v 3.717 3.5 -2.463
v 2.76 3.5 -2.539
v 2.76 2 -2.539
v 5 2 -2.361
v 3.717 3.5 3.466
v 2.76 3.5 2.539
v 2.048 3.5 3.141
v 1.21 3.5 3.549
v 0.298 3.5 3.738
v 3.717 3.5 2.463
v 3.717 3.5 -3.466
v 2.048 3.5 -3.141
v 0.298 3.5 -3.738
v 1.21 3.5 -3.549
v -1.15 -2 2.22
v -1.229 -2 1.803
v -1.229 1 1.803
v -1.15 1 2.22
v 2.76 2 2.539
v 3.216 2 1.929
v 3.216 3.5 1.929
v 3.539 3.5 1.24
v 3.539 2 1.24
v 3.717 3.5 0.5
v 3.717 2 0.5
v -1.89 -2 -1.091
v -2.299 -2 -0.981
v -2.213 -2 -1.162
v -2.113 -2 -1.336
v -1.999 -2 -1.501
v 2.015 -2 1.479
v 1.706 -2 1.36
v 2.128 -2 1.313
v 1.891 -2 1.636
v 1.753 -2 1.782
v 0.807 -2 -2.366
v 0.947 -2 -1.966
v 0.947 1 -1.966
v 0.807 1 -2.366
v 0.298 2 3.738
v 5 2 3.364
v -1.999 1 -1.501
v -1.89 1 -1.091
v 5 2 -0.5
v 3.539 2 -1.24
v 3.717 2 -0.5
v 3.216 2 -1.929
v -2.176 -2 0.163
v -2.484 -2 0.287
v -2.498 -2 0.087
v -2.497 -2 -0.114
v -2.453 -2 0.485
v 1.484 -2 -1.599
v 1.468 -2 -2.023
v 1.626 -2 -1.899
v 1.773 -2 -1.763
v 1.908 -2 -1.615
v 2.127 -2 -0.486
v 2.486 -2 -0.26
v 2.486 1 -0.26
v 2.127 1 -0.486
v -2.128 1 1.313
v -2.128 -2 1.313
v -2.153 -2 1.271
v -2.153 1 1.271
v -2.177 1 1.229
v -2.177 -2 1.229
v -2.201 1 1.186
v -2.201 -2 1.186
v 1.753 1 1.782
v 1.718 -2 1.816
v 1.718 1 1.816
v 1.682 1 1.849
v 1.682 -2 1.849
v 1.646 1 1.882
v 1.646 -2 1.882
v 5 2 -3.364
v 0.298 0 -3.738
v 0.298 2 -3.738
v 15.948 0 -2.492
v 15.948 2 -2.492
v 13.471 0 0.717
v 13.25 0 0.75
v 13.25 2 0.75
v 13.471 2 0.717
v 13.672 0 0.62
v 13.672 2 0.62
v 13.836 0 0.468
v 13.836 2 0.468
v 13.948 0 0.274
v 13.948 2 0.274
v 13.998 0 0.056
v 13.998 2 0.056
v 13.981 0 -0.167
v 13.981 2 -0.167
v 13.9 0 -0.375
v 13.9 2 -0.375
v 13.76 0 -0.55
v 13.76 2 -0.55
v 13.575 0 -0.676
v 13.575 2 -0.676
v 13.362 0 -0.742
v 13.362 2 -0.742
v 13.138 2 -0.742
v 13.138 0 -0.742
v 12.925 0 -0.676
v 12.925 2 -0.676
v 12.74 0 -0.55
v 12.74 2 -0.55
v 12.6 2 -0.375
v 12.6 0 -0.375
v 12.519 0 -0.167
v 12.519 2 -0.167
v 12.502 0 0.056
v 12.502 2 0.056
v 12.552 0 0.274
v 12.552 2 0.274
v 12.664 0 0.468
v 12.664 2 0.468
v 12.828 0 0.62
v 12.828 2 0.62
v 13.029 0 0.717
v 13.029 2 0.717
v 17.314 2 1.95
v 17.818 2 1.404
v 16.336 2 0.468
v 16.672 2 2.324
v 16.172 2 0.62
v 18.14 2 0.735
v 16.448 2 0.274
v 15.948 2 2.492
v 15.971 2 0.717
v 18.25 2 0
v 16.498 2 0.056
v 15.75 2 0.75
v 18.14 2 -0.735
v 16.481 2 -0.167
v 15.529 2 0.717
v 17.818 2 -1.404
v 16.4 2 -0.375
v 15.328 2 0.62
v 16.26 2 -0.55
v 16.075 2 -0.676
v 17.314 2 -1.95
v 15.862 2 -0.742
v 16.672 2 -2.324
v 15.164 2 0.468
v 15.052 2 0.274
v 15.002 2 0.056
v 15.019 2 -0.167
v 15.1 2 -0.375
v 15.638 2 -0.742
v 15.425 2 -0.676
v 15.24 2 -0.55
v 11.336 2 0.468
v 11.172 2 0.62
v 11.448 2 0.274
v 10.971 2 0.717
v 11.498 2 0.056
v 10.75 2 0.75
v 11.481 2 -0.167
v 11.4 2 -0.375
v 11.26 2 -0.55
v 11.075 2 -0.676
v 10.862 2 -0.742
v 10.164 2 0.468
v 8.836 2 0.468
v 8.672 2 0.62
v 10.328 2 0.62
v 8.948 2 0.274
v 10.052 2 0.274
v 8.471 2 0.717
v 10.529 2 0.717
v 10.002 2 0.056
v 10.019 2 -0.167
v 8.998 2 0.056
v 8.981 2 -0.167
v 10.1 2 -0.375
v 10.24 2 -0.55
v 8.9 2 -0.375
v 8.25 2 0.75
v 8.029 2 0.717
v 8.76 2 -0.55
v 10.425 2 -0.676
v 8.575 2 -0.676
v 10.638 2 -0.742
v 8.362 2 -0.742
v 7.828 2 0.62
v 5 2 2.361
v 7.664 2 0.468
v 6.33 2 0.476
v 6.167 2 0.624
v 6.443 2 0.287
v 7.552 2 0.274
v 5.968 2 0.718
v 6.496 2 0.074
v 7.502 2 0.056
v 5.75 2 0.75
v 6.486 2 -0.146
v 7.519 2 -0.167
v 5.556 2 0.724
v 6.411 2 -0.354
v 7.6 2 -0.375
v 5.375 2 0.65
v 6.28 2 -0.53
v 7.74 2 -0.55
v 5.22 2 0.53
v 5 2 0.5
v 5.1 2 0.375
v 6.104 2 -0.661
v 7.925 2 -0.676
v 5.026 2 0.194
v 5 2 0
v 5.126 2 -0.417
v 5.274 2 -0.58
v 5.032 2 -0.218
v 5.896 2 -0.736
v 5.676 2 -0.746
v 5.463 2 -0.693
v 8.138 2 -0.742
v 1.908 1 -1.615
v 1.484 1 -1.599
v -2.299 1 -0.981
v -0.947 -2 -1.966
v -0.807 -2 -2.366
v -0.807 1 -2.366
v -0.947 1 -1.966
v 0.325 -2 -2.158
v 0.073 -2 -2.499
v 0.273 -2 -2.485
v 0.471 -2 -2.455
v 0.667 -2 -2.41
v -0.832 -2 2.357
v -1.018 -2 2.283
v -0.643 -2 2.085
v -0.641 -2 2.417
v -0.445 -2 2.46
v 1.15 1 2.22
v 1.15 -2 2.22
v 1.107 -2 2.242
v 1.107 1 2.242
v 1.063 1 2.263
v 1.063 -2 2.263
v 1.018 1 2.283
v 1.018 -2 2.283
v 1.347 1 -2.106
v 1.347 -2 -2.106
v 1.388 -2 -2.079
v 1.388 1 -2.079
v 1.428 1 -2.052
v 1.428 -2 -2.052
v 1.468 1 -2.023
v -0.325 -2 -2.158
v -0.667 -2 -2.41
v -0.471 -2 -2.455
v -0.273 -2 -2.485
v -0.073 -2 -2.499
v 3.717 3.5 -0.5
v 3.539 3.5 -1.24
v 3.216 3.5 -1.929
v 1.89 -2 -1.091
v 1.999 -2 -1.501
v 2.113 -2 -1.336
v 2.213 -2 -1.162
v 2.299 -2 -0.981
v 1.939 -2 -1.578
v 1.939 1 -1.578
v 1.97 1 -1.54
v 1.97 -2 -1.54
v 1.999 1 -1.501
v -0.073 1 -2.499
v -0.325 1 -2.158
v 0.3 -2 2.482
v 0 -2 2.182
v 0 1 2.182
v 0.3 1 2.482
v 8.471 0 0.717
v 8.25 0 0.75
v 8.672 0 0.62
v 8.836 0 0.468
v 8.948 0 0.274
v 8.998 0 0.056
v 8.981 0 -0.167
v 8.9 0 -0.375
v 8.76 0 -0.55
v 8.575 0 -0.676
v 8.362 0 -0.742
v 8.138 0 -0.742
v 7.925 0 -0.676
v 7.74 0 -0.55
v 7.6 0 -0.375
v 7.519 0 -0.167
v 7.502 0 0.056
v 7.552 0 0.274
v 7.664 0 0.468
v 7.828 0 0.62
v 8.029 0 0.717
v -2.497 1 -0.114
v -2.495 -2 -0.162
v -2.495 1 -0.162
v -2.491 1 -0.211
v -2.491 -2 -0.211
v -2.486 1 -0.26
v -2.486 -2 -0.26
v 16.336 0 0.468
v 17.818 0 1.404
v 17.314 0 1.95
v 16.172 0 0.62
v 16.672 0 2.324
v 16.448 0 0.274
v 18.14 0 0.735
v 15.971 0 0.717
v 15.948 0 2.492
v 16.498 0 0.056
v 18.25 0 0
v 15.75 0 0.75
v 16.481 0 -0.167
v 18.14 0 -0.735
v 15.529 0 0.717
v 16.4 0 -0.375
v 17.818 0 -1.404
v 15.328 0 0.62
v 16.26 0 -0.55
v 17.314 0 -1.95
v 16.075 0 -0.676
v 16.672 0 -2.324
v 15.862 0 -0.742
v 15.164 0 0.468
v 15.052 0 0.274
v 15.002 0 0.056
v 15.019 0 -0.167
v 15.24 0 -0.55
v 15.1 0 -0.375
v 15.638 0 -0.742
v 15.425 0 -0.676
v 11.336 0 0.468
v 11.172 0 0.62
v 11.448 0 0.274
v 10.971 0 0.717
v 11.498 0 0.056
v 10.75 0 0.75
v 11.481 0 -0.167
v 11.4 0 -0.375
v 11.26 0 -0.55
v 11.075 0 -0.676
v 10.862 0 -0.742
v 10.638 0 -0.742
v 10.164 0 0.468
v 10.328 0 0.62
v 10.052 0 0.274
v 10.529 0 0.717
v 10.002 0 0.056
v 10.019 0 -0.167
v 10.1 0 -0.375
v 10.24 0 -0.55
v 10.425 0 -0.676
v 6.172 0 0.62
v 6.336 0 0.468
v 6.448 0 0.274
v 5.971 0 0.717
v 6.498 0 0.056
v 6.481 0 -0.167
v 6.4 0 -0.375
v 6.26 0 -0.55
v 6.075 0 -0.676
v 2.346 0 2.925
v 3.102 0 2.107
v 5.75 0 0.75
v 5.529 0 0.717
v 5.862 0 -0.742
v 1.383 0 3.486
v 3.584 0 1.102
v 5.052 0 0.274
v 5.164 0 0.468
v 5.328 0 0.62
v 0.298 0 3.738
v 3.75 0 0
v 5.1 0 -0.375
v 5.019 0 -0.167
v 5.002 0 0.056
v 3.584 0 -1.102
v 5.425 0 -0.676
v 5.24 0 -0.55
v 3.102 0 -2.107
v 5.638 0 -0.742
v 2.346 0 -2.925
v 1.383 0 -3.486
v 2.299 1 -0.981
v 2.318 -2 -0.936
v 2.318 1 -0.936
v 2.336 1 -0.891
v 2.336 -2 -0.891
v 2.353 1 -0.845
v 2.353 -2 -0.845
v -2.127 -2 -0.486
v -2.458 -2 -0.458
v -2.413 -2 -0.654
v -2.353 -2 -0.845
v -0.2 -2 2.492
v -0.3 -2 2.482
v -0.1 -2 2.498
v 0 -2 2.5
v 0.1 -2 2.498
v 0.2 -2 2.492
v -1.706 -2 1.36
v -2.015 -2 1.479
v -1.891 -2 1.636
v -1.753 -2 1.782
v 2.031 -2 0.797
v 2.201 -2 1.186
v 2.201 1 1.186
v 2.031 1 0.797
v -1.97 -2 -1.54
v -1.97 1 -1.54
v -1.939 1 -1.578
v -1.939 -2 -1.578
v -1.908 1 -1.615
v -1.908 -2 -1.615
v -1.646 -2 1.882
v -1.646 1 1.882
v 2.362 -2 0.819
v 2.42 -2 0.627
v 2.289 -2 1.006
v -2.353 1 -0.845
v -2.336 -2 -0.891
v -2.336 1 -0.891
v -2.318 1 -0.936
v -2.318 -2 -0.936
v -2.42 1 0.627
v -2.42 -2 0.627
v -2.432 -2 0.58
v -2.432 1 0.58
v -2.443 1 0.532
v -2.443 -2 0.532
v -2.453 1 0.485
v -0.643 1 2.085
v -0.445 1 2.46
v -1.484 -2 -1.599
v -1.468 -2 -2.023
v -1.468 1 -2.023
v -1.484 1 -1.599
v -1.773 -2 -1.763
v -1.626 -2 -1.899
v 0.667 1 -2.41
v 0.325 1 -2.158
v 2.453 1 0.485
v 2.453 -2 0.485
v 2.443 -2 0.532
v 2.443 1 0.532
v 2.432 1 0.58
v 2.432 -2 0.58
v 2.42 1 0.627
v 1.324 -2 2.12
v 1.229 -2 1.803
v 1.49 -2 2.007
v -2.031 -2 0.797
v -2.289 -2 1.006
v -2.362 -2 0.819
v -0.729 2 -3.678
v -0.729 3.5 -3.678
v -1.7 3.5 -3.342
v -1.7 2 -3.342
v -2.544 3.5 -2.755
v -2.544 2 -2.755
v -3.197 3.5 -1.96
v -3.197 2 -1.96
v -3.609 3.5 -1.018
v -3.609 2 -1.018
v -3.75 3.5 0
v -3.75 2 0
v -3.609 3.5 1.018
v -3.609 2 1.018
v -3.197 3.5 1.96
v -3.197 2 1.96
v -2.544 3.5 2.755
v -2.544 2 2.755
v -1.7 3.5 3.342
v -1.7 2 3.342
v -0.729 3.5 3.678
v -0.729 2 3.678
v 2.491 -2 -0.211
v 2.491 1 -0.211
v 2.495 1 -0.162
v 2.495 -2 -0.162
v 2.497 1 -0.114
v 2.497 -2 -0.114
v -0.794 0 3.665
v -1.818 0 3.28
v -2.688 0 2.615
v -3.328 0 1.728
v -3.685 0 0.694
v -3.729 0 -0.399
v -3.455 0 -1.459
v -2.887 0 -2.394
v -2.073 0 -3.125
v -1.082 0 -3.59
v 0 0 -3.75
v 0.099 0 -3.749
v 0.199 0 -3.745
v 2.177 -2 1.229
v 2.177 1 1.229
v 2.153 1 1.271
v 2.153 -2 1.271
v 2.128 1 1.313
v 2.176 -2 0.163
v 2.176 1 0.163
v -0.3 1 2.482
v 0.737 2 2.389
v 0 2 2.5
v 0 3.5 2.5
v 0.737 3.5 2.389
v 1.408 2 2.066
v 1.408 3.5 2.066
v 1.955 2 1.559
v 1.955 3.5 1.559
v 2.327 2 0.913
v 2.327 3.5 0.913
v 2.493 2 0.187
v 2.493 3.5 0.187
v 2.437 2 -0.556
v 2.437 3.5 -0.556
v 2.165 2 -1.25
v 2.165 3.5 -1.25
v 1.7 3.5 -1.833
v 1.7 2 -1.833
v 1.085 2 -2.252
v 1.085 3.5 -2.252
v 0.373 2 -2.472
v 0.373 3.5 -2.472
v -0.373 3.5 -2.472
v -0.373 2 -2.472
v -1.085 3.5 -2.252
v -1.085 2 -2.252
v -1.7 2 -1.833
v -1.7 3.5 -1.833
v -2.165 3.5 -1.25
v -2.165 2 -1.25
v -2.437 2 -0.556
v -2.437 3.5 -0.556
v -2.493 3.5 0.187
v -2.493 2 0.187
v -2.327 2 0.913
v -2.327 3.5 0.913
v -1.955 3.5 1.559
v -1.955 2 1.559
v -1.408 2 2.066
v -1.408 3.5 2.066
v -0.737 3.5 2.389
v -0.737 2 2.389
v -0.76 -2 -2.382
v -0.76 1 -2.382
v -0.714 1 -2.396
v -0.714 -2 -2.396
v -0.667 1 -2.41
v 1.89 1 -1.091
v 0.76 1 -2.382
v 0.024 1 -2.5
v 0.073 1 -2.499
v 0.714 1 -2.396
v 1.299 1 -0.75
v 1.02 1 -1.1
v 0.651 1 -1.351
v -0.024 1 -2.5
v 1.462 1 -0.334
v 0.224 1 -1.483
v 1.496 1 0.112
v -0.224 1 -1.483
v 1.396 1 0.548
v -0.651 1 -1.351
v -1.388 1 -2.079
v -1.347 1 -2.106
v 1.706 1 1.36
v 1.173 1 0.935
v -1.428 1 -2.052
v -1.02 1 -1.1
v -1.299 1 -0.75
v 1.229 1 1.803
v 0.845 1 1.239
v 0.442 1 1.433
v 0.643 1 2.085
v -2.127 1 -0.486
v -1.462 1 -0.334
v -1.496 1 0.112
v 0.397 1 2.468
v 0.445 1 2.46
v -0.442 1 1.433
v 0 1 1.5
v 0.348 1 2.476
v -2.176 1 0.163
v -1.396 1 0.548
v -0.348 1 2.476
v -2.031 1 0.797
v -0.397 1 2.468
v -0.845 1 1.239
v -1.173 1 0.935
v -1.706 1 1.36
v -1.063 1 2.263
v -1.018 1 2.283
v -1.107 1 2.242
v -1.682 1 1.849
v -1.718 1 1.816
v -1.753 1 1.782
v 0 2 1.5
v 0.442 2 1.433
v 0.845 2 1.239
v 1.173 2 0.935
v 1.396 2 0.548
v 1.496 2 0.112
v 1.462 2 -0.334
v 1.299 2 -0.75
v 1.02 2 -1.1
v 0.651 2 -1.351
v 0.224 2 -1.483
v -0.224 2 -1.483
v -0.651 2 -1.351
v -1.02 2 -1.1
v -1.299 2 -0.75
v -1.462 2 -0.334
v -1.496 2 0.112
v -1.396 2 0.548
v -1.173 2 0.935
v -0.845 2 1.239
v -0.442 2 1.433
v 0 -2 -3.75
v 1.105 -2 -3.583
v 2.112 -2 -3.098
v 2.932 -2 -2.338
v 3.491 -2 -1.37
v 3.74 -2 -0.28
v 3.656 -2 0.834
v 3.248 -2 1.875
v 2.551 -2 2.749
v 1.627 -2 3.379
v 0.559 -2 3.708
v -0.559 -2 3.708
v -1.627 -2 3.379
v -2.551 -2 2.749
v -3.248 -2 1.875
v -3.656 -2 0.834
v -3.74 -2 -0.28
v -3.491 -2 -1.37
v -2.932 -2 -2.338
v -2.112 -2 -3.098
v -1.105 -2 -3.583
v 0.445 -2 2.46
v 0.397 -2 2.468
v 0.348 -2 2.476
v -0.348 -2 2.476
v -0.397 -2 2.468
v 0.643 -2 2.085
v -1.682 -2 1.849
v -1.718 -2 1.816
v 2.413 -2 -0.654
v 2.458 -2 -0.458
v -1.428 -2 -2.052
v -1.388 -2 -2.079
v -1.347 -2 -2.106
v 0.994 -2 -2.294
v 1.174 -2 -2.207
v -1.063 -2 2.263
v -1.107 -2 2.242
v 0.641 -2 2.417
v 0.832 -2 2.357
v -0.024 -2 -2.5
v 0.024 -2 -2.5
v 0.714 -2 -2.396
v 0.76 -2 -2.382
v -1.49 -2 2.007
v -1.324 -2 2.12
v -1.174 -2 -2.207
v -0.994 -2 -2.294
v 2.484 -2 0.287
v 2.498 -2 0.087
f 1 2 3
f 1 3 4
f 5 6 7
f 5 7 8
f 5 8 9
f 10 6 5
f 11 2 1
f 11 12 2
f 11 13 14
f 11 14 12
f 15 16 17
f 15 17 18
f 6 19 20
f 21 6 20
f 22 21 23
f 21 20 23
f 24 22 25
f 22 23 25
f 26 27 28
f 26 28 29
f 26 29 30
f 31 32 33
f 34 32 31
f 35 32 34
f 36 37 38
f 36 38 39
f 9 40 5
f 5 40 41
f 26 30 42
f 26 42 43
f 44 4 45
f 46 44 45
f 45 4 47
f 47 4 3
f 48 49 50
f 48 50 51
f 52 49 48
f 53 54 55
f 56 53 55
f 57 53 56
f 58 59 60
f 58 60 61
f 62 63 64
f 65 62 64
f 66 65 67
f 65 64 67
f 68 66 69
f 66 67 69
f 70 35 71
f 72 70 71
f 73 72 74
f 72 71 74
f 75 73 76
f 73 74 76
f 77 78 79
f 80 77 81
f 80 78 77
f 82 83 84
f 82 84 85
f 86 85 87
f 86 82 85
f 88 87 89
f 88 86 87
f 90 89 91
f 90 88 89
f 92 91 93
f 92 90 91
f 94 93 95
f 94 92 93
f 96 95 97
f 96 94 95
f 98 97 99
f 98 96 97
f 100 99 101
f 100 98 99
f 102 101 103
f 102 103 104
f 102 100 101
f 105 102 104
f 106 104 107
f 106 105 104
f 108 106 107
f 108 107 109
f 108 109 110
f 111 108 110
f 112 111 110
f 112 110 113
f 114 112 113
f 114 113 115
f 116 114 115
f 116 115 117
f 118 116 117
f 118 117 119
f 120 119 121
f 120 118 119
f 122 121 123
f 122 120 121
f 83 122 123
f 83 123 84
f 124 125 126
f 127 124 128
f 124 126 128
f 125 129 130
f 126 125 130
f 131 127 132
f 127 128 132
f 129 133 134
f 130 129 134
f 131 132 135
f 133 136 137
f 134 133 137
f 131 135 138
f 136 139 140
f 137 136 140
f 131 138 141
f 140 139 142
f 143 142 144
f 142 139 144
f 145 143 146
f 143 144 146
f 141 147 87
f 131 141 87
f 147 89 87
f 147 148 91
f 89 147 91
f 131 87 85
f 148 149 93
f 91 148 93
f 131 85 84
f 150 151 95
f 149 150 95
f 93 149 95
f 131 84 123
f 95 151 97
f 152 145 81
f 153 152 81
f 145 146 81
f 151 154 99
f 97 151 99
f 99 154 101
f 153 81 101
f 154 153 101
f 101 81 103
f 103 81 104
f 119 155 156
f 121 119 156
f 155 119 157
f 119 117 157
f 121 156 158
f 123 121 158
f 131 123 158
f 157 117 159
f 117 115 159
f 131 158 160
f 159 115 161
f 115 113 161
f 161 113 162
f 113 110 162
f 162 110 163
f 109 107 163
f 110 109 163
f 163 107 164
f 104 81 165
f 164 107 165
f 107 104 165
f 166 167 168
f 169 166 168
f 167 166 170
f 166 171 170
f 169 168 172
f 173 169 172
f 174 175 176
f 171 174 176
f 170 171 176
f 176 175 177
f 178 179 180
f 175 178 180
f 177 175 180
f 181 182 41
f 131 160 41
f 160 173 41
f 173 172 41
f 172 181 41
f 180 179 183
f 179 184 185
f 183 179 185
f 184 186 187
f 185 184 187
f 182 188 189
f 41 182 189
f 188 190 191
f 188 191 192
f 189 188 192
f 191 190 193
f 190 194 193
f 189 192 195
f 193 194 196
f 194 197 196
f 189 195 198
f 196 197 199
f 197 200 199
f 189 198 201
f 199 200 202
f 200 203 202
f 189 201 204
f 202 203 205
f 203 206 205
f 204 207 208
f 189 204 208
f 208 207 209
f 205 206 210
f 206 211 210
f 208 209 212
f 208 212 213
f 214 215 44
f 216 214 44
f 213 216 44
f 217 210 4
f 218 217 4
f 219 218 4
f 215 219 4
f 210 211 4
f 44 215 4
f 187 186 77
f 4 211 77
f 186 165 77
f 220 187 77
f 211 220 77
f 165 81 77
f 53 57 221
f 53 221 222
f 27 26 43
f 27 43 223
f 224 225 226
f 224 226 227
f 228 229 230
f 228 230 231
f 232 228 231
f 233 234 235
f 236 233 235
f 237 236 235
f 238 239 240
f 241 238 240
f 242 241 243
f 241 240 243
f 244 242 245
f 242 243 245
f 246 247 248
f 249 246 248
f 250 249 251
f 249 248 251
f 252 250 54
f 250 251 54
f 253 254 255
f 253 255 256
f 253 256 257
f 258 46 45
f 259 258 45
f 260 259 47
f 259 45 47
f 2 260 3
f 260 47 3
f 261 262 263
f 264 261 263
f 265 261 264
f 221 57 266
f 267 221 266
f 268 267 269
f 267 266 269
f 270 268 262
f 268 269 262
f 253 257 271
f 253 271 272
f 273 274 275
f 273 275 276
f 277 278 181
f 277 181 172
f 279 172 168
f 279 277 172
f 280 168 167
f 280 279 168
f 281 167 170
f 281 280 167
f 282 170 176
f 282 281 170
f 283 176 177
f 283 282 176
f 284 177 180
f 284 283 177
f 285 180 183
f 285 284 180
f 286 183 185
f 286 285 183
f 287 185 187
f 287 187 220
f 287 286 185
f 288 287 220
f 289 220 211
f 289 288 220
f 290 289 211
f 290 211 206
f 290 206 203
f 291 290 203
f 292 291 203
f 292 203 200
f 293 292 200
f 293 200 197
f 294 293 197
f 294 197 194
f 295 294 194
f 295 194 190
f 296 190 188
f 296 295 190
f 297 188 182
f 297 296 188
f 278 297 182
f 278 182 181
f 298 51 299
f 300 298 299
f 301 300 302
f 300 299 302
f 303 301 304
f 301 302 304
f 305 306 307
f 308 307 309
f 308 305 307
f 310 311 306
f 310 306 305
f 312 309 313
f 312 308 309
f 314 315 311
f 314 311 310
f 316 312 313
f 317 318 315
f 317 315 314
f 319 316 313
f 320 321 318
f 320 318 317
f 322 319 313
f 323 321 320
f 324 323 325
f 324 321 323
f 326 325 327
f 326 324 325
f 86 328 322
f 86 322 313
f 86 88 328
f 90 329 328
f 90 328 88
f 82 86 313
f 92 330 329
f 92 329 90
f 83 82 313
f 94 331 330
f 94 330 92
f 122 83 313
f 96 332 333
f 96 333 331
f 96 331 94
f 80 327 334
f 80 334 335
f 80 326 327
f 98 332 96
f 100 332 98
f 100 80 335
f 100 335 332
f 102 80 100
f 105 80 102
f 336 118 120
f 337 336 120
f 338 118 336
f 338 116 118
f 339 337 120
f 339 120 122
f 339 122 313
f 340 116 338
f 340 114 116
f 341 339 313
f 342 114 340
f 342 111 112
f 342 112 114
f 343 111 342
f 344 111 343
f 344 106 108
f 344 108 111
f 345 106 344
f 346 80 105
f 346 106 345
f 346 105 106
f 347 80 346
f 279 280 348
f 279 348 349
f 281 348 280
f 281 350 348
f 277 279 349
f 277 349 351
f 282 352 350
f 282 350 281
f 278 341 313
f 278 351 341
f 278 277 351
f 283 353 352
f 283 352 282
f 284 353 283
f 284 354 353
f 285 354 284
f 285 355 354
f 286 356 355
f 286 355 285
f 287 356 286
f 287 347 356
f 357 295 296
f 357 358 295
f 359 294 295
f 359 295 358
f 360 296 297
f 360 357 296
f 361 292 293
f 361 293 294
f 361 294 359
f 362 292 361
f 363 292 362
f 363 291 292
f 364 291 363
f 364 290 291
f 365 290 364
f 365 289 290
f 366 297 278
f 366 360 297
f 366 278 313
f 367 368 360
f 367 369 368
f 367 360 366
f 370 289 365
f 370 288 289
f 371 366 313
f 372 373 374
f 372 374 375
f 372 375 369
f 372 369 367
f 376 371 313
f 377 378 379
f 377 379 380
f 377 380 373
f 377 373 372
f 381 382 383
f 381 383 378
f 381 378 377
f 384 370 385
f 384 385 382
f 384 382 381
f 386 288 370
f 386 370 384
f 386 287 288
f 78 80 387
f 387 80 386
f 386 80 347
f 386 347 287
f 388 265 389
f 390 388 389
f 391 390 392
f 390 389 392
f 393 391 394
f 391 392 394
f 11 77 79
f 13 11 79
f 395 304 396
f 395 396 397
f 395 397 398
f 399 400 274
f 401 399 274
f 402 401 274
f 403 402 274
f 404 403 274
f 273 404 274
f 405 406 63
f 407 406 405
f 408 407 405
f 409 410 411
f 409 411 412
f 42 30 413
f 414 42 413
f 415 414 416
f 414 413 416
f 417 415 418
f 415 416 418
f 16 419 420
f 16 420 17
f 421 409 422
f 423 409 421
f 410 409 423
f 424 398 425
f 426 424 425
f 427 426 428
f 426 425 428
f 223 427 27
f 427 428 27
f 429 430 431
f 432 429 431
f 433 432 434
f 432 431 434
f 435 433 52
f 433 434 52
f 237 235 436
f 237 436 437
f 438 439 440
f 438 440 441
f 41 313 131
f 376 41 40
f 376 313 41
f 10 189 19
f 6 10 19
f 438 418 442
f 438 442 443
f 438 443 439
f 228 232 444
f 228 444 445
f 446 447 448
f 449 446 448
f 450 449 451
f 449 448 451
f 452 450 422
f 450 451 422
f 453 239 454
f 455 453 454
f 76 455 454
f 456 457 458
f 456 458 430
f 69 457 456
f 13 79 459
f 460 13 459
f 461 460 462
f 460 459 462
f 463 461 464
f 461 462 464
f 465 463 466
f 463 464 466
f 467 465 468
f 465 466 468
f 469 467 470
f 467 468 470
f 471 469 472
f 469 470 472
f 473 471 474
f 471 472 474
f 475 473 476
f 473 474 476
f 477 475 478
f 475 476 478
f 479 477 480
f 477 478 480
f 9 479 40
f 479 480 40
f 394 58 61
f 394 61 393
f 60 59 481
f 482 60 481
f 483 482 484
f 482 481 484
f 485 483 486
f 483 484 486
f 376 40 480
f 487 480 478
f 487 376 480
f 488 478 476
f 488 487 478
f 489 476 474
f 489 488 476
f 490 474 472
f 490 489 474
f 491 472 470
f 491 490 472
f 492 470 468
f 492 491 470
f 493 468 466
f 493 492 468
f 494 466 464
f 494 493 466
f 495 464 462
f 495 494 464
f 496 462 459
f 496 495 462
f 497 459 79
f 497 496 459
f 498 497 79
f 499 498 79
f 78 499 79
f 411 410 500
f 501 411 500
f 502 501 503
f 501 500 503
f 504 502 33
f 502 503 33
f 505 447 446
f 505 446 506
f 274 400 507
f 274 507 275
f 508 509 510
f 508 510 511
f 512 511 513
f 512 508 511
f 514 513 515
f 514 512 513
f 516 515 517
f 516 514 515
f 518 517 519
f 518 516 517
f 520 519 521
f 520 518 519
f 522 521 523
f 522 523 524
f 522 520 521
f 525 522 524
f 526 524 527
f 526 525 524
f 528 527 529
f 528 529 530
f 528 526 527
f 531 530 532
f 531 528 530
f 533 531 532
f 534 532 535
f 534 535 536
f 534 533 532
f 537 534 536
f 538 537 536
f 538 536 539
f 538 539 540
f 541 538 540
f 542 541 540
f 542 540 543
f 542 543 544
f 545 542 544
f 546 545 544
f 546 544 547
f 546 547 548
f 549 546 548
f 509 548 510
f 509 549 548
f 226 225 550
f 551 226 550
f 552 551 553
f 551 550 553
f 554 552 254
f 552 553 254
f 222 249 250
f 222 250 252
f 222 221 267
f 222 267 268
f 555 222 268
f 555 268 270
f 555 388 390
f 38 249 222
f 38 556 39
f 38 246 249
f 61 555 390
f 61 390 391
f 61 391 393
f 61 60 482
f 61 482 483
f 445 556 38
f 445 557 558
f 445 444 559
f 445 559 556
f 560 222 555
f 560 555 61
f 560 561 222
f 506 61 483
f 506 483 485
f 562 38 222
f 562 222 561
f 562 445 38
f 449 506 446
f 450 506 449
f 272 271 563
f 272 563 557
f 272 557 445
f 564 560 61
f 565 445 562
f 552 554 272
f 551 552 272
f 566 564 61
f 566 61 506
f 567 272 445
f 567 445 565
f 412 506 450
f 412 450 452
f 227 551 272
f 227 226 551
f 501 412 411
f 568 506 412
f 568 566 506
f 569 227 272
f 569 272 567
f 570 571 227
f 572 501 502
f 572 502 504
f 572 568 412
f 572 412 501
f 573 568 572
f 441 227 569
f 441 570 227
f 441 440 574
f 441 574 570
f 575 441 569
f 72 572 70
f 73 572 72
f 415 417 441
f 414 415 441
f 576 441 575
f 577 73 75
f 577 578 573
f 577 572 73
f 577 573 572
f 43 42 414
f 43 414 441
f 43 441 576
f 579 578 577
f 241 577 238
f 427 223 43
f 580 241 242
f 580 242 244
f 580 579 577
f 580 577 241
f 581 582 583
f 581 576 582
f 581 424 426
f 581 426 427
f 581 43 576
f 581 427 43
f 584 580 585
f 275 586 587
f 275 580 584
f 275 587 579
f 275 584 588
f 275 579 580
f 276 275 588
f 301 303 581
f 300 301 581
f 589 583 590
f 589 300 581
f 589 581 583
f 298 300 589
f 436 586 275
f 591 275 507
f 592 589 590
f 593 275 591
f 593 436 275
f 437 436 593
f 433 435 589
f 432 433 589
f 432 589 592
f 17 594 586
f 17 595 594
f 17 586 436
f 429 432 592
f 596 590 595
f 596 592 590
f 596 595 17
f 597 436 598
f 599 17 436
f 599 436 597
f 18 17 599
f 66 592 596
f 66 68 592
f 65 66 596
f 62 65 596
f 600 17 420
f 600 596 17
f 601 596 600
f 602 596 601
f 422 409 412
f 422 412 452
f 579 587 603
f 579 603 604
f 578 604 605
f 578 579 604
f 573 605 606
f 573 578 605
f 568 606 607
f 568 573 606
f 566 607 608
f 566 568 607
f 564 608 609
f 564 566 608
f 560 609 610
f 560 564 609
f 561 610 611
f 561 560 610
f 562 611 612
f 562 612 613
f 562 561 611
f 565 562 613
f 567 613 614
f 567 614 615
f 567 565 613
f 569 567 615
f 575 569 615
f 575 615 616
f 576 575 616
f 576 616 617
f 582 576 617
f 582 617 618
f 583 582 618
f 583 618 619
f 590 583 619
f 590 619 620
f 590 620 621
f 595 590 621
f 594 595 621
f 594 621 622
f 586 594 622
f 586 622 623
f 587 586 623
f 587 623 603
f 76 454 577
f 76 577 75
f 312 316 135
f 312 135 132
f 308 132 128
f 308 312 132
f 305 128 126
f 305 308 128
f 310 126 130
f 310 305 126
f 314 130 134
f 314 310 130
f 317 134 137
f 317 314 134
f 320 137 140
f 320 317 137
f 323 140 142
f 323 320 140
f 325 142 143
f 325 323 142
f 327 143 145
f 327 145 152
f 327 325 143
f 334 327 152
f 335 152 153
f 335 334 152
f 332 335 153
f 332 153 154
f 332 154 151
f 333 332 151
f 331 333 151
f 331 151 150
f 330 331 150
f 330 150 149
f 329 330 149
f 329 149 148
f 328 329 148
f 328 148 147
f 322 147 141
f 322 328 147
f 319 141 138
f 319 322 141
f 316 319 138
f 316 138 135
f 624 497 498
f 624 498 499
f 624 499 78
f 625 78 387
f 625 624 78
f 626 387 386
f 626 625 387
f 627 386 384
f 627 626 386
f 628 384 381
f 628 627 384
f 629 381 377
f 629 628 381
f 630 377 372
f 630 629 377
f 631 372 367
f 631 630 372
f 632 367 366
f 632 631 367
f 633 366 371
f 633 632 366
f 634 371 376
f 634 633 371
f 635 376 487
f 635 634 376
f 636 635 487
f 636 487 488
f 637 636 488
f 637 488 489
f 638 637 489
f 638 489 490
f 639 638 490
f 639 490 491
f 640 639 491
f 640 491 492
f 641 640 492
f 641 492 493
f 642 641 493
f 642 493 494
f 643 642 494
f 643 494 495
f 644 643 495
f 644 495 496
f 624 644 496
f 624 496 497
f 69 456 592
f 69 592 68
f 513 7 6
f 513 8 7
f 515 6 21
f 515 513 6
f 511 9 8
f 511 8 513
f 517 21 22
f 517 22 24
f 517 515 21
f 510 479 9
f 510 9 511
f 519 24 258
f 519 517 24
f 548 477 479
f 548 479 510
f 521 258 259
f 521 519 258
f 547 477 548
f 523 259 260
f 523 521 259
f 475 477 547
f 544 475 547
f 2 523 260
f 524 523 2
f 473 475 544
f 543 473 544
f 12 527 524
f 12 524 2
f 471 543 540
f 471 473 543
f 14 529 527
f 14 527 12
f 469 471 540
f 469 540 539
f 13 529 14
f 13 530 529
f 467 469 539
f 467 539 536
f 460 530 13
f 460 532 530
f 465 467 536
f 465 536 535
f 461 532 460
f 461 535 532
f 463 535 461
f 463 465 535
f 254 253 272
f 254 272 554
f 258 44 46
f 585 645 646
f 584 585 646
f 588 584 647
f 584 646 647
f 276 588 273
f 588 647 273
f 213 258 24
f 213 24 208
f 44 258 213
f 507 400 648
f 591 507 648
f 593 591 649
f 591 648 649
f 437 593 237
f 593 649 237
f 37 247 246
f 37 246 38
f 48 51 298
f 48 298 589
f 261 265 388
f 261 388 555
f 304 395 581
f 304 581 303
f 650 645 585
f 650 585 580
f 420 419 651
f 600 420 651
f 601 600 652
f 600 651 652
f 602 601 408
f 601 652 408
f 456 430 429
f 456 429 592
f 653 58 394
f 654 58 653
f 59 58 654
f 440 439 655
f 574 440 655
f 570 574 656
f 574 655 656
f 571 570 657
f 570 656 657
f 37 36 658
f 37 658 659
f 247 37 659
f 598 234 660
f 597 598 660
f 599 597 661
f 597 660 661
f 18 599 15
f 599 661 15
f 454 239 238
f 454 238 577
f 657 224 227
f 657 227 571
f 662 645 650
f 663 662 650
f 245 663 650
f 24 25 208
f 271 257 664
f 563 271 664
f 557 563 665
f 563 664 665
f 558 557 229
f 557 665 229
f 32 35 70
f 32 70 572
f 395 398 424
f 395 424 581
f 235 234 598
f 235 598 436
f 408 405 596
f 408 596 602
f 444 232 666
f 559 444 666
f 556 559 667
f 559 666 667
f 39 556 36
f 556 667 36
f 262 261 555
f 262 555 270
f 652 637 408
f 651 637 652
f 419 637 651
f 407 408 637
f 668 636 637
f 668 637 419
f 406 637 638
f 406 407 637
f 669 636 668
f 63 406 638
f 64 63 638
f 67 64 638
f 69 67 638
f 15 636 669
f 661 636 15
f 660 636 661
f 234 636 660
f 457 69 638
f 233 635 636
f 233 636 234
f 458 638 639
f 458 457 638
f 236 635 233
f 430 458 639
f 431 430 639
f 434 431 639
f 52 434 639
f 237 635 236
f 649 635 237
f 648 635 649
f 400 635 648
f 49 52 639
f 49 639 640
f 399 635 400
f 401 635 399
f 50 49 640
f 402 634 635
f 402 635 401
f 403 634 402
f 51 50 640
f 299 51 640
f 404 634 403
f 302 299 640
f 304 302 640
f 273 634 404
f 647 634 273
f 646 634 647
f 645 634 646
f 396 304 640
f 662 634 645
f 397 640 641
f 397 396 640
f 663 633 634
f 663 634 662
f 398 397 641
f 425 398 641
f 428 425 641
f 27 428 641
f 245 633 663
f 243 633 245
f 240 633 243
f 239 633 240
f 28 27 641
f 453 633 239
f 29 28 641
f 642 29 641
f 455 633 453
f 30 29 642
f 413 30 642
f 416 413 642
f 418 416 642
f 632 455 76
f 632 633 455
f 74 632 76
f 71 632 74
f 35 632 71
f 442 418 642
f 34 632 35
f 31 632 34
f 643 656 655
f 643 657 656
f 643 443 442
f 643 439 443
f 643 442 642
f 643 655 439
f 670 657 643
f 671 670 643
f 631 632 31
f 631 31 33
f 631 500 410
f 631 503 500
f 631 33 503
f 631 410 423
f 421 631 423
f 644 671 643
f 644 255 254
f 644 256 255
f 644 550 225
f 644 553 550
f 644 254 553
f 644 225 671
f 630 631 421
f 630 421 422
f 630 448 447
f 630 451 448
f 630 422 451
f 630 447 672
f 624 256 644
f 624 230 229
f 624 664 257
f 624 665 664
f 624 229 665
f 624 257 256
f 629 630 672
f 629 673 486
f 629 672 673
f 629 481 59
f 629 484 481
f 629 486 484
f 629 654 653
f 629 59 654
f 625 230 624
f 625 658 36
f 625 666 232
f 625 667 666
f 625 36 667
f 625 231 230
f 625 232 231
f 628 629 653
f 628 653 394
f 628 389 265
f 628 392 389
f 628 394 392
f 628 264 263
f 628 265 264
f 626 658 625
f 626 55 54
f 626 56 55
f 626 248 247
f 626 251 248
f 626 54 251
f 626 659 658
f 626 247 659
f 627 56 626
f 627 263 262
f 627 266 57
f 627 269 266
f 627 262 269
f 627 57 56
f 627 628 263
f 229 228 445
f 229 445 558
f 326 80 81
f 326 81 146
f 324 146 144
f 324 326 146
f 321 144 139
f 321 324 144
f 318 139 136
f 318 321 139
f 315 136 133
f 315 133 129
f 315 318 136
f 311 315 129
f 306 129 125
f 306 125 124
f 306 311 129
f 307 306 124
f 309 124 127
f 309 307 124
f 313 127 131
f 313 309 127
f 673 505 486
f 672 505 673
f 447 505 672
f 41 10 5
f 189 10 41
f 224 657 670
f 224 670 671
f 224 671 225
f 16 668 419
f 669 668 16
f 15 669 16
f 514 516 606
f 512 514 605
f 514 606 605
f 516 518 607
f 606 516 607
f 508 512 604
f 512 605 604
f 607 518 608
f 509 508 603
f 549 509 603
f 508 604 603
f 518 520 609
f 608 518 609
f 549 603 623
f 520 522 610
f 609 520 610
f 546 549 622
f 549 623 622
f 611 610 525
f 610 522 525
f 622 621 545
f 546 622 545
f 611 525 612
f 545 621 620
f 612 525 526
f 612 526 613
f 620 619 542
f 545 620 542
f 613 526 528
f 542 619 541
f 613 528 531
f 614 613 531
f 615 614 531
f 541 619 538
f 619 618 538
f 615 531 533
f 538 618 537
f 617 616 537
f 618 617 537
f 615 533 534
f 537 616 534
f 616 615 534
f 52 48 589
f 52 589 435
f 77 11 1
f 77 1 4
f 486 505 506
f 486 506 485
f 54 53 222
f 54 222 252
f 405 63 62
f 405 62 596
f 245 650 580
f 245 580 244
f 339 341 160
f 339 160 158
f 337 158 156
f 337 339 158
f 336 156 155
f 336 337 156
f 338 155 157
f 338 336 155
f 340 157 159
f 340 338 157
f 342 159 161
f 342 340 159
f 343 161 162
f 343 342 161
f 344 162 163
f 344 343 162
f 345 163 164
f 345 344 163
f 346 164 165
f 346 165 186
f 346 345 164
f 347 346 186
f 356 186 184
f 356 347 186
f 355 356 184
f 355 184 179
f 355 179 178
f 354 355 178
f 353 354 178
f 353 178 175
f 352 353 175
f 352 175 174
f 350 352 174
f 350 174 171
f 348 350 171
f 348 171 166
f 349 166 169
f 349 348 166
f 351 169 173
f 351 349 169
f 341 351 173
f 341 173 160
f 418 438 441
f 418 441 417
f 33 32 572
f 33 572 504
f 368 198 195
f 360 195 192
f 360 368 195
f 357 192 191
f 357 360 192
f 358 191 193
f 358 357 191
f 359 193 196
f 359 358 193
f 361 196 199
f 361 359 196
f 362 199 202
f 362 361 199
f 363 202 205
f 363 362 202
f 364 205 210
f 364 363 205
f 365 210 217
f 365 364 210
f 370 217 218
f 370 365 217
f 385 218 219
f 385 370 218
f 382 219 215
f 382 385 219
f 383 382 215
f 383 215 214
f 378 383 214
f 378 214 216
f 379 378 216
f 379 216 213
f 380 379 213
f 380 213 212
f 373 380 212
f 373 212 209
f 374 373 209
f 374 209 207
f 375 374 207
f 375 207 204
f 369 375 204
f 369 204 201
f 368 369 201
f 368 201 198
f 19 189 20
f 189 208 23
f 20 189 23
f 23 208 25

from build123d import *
from build123d.topology import SkipClean

# Parameters (mm, degrees)
ESBO_O1_R                  = 0.75
ESBO_O1_R_2                = 1.5
RESSALTO_EXTRUS_O1_DEPTH   = 2
ESBO_O3_R                  = 3.75
ESBO_O3_R_2                = 2.5
RESSALTO_EXTRUS_O2_DEPTH   = 1.5
RESSALTO_EXTRUS_O3_DEPTH   = 1.5
CORTE_EXTRUS_O1_DEPTH      = 19.95718861
CORTE_EXTRUS_O1_DEPTH_BACK = 19.95718861
RESSALTO_EXTRUS_O4_START   = 2
ESBO_O7_R                  = 3.75
ESBO_O7_R_2                = 1.5
RESSALTO_EXTRUS_O4_DEPTH   = 2
ESBO_O8_R                  = 2.5
CORTE_EXTRUS_O2_DEPTH      = 3
RESSALTO_EXTRUS_O5_START   = 3
RESSALTO_EXTRUS_O5_DEPTH   = 3


with BuildPart() as part:
    # Esboço1 → Ressalto-extrusão1 (new body)
    with BuildSketch(Plane(origin=(0, 0, 0), x_dir=(1, 0, 0), z_dir=(0, 1, 0))):
        with BuildLine():
            Line((0.297619048, 3.738171064), (15.948412698, 2.492114043))
            ThreePointArc((15.948412698, 2.492114043), (18.25, 0), (15.948412698, -2.492114043))
            Line((15.948412698, -2.492114043), (0.297619048, -3.738171064))
            ThreePointArc((0.297619048, -3.738171064), (-3.75, 0), (0.297619048, 3.738171064))
        make_face()
        with Locations(Location((15.75, 0, 0), (0, 0, 270))):
            Circle(ESBO_O1_R, mode=Mode.SUBTRACT)
        with Locations(Location((0, 0, 0), (0, 0, 270))):
            Circle(ESBO_O1_R_2, mode=Mode.SUBTRACT)
        with Locations(Location((13.25, 0, 0), (0, 0, 270))):
            Circle(ESBO_O1_R, mode=Mode.SUBTRACT)
        with Locations(Location((10.75, 0, 0), (0, 0, 270))):
            Circle(ESBO_O1_R, mode=Mode.SUBTRACT)
        with Locations(Location((8.25, 0, 0), (0, 0, 270))):
            Circle(ESBO_O1_R, mode=Mode.SUBTRACT)
        with Locations(Location((5.75, 0, 0), (0, 0, 270))):
            Circle(ESBO_O1_R, mode=Mode.SUBTRACT)
    extrude(amount=RESSALTO_EXTRUS_O1_DEPTH)

    # Esboço3 → Ressalto-extrusão2 (add)
    with SkipClean():  # the faces are left unmerged after this step: merging them gives an invalid solid
        with BuildSketch(Plane(origin=(0, 2, 0), x_dir=(1, 0, 0), z_dir=(0, 1, 0))):
            with Locations(Location((0, 0, 0), (0, 0, 85.447928579))):
                Circle(ESBO_O3_R)
            with Locations(Location((0, 0, 0), (0, 0, 270))):
                Circle(ESBO_O3_R_2, mode=Mode.SUBTRACT)
        extrude(amount=RESSALTO_EXTRUS_O2_DEPTH)

    # Esboço5 → Ressalto-extrusão3 (add)
    with SkipClean():  # the faces are left unmerged after this step: merging them gives an invalid solid
        with BuildSketch(Plane(origin=(0, 2, 0), x_dir=(1, 0, 0), z_dir=(0, 1, 0))):
            with BuildLine():
                Line((5, 2.360620906), (5, 3.36378527))
                Line((5, 3.36378527), (0.297619048, 3.738171064))
                ThreePointArc((0.297619048, 3.738171064), (1.642055332, 3.37137276), (2.759721595, 2.538983403))
                Line((2.759721595, 2.538983403), (5, 2.360620906))
            make_face()
            with BuildLine():
                Line((5, 0.5), (3.716517187, 0.5))
                ThreePointArc((3.716517187, 0.5), (3.75, 0), (3.716517187, -0.5))
                Line((3.716517187, -0.5), (5, -0.5))
                Line((5, -0.5), (5, 0.5))
            make_face()
            with BuildLine():
                Line((5, -2.360620906), (2.759721595, -2.538983403))
                ThreePointArc((2.759721595, -2.538983403), (1.642055332, -3.37137276), (0.297619048, -3.738171064))
                Line((0.297619048, -3.738171064), (5, -3.36378527))
                Line((5, -3.36378527), (5, -2.360620906))
            make_face()
        extrude(amount=RESSALTO_EXTRUS_O3_DEPTH)

    # Esboço6 → Corte-extrusão1 (cut, two sides: drawn at the far end of the back side and taken through both)
    with SkipClean():  # the faces are left unmerged after this step: merging them gives an invalid solid
        with BuildSketch(Plane.XY.offset(-CORTE_EXTRUS_O1_DEPTH_BACK)):
            Polygon((3.716517187, 3.5), (5, 2), (5, 3.5), align=None)
        extrude(amount=CORTE_EXTRUS_O1_DEPTH + CORTE_EXTRUS_O1_DEPTH_BACK, mode=Mode.SUBTRACT)

    # Esboço7 → Ressalto-extrusão4 (add)
    with SkipClean():  # the faces are left unmerged after this step: merging them gives an invalid solid
        with BuildSketch(Plane.XZ.offset(RESSALTO_EXTRUS_O4_START)):
            with Locations(Location((0, 0, 0), (0, 0, 270))):
                Circle(ESBO_O7_R)
            with Locations(Location((0, 0, 0), (0, 0, 270))):
                Circle(ESBO_O7_R_2, mode=Mode.SUBTRACT)
        extrude(amount=-RESSALTO_EXTRUS_O4_DEPTH)

    # Esboço8 → Corte-extrusão2 (cut)
    with SkipClean():  # the faces are left unmerged after this step: merging them gives an invalid solid
        with BuildSketch(Plane.XZ.offset(2)):
            with Locations(Location((0, 0, 0), (0, 0, 90))):
                Circle(ESBO_O8_R)
        extrude(amount=-CORTE_EXTRUS_O2_DEPTH, mode=Mode.SUBTRACT)

    # Esboço9 → Ressalto-extrusão5 (add)
    with SkipClean():  # the faces are left unmerged after this step: merging them gives an invalid solid
        with BuildSketch(Plane.XZ.offset(-1).offset(RESSALTO_EXTRUS_O5_START)):
            with BuildLine():
                Line((-0.3, 2.481934729), (0, 2.181934729))
                Line((0, 2.181934729), (0.3, 2.481934729))
                ThreePointArc((0.3, 2.481934729), (0, 2.5), (-0.3, 2.481934729))
            make_face()
            with BuildLine():
                Line((0.444891262, 2.460095885), (0.643136552, 2.084997491))
                Line((0.643136552, 2.084997491), (1.018234946, 2.283242781))
                ThreePointArc((1.018234946, 2.283242781), (0.736887936, 2.388932014), (0.444891262, 2.460095885))
            make_face()
            with BuildLine():
                Line((1.150251983, 2.219666726), (1.229127598, 1.802799076))
                Line((1.229127598, 1.802799076), (1.645995248, 1.881674691))
                ThreePointArc((1.645995248, 1.881674691), (1.408300145, 2.065596936), (1.150251983, 2.219666726))
            make_face()
            with BuildLine():
                Line((1.753407768, 1.782010437), (1.705905264, 1.360414052))
                Line((1.705905264, 1.360414052), (2.127501649, 1.312911548))
                ThreePointArc((2.127501649, 1.312911548), (1.954578706, 1.558724505), (1.753407768, 1.782010437))
            make_face()
            with BuildLine():
                Line((2.200765578, 1.186014701), (2.031105761, 0.797150269))
                Line((2.031105761, 0.797150269), (2.419970193, 0.627490452))
                ThreePointArc((2.419970193, 0.627490452), (2.327184372, 0.913352561), (2.200765578, 1.186014701))
            make_face()
            with BuildLine():
                Line((2.452575708, 0.484636354), (2.175833597, 0.163056187))
                Line((2.175833597, 0.163056187), (2.497413764, -0.113685925))
                ThreePointArc((2.497413764, -0.113685925), (2.493009493, 0.186825234), (2.452575708, 0.484636354))
            make_face()
            with BuildLine():
                Line((2.486463724, -0.25980406), (2.12722907, -0.485526154))
                Line((2.12722907, -0.485526154), (2.352951164, -0.844760808))
                ThreePointArc((2.352951164, -0.844760808), (2.43731978, -0.556302335), (2.486463724, -0.25980406))
            make_face()
            with BuildLine():
                Line((2.299418526, -0.981159743), (1.889610905, -1.090967365))
                Line((1.889610905, -1.090967365), (1.999418526, -1.500774986))
                ThreePointArc((1.999418526, -1.500774986), (2.165063509, -1.25), (2.299418526, -0.981159743))
            make_face()
            with BuildLine():
                Line((1.908059901, -1.615335078), (1.484092518, -1.599471337))
                Line((1.484092518, -1.599471337), (1.468228778, -2.02343872))
                ThreePointArc((1.468228778, -2.02343872), (1.700431844, -1.83262968), (1.908059901, -1.615335078))
            make_face()
            with BuildLine():
                Line((1.347161781, -2.105980801), (0.946705999, -1.965855263))
                Line((0.946705999, -1.965855263), (0.80658046, -2.366311045))
                ThreePointArc((0.80658046, -2.366311045), (1.084709348, -2.25242217), (1.347161781, -2.105980801))
            make_face()
            with BuildLine():
                Line((0.666562424, -2.409500889), (0.325200497, -2.157564321))
                Line((0.325200497, -2.157564321), (0.073263929, -2.498926249))
                ThreePointArc((0.073263929, -2.498926249), (0.372605665, -2.472077066), (0.666562424, -2.409500889))
            make_face()
            with BuildLine():
                Line((-0.073263929, -2.498926249), (-0.325200497, -2.157564321))
                Line((-0.325200497, -2.157564321), (-0.666562424, -2.409500889))
                ThreePointArc((-0.666562424, -2.409500889), (-0.372605665, -2.472077066), (-0.073263929, -2.498926249))
            make_face()
            with BuildLine():
                Line((-0.80658046, -2.366311045), (-0.946705999, -1.965855263))
                Line((-0.946705999, -1.965855263), (-1.347161781, -2.105980801))
                ThreePointArc((-1.347161781, -2.105980801), (-1.084709348, -2.25242217), (-0.80658046, -2.366311045))
            make_face()
            with BuildLine():
                Line((-1.468228778, -2.02343872), (-1.484092518, -1.599471337))
                Line((-1.484092518, -1.599471337), (-1.908059901, -1.615335078))
                ThreePointArc((-1.908059901, -1.615335078), (-1.700431844, -1.83262968), (-1.468228778, -2.02343872))
            make_face()
            with BuildLine():
                Line((-1.999418526, -1.500774986), (-1.889610905, -1.090967365))
                Line((-1.889610905, -1.090967365), (-2.299418526, -0.981159743))
                ThreePointArc((-2.299418526, -0.981159743), (-2.165063509, -1.25), (-1.999418526, -1.500774986))
            make_face()
            with BuildLine():
                Line((-2.352951164, -0.844760808), (-2.12722907, -0.485526154))
                Line((-2.12722907, -0.485526154), (-2.486463724, -0.25980406))
                ThreePointArc((-2.486463724, -0.25980406), (-2.43731978, -0.556302335), (-2.352951164, -0.844760808))
            make_face()
            with BuildLine():
                Line((-2.497413764, -0.113685925), (-2.175833597, 0.163056187))
                Line((-2.175833597, 0.163056187), (-2.452575708, 0.484636354))
                ThreePointArc((-2.452575708, 0.484636354), (-2.493009493, 0.186825234), (-2.497413764, -0.113685925))
            make_face()
            with BuildLine():
                Line((-2.419970193, 0.627490452), (-2.031105761, 0.797150269))
                Line((-2.031105761, 0.797150269), (-2.200765578, 1.186014701))
                ThreePointArc((-2.200765578, 1.186014701), (-2.327184372, 0.913352561), (-2.419970193, 0.627490452))
            make_face()
            with BuildLine():
                Line((-2.127501649, 1.312911548), (-1.705905264, 1.360414052))
                Line((-1.705905264, 1.360414052), (-1.753407768, 1.782010437))
                ThreePointArc((-1.753407768, 1.782010437), (-1.954578706, 1.558724505), (-2.127501649, 1.312911548))
            make_face()
            with BuildLine():
                Line((-1.645995248, 1.881674691), (-1.229127598, 1.802799076))
                Line((-1.229127598, 1.802799076), (-1.150251983, 2.219666726))
                ThreePointArc((-1.150251983, 2.219666726), (-1.408300145, 2.065596936), (-1.645995248, 1.881674691))
            make_face()
            with BuildLine():
                Line((-1.018234946, 2.283242781), (-0.643136552, 2.084997491))
                Line((-0.643136552, 2.084997491), (-0.444891262, 2.460095885))
                ThreePointArc((-0.444891262, 2.460095885), (-0.736887936, 2.388932014), (-1.018234946, 2.283242781))
            make_face()
        extrude(amount=-RESSALTO_EXTRUS_O5_DEPTH)


solid = part.part
